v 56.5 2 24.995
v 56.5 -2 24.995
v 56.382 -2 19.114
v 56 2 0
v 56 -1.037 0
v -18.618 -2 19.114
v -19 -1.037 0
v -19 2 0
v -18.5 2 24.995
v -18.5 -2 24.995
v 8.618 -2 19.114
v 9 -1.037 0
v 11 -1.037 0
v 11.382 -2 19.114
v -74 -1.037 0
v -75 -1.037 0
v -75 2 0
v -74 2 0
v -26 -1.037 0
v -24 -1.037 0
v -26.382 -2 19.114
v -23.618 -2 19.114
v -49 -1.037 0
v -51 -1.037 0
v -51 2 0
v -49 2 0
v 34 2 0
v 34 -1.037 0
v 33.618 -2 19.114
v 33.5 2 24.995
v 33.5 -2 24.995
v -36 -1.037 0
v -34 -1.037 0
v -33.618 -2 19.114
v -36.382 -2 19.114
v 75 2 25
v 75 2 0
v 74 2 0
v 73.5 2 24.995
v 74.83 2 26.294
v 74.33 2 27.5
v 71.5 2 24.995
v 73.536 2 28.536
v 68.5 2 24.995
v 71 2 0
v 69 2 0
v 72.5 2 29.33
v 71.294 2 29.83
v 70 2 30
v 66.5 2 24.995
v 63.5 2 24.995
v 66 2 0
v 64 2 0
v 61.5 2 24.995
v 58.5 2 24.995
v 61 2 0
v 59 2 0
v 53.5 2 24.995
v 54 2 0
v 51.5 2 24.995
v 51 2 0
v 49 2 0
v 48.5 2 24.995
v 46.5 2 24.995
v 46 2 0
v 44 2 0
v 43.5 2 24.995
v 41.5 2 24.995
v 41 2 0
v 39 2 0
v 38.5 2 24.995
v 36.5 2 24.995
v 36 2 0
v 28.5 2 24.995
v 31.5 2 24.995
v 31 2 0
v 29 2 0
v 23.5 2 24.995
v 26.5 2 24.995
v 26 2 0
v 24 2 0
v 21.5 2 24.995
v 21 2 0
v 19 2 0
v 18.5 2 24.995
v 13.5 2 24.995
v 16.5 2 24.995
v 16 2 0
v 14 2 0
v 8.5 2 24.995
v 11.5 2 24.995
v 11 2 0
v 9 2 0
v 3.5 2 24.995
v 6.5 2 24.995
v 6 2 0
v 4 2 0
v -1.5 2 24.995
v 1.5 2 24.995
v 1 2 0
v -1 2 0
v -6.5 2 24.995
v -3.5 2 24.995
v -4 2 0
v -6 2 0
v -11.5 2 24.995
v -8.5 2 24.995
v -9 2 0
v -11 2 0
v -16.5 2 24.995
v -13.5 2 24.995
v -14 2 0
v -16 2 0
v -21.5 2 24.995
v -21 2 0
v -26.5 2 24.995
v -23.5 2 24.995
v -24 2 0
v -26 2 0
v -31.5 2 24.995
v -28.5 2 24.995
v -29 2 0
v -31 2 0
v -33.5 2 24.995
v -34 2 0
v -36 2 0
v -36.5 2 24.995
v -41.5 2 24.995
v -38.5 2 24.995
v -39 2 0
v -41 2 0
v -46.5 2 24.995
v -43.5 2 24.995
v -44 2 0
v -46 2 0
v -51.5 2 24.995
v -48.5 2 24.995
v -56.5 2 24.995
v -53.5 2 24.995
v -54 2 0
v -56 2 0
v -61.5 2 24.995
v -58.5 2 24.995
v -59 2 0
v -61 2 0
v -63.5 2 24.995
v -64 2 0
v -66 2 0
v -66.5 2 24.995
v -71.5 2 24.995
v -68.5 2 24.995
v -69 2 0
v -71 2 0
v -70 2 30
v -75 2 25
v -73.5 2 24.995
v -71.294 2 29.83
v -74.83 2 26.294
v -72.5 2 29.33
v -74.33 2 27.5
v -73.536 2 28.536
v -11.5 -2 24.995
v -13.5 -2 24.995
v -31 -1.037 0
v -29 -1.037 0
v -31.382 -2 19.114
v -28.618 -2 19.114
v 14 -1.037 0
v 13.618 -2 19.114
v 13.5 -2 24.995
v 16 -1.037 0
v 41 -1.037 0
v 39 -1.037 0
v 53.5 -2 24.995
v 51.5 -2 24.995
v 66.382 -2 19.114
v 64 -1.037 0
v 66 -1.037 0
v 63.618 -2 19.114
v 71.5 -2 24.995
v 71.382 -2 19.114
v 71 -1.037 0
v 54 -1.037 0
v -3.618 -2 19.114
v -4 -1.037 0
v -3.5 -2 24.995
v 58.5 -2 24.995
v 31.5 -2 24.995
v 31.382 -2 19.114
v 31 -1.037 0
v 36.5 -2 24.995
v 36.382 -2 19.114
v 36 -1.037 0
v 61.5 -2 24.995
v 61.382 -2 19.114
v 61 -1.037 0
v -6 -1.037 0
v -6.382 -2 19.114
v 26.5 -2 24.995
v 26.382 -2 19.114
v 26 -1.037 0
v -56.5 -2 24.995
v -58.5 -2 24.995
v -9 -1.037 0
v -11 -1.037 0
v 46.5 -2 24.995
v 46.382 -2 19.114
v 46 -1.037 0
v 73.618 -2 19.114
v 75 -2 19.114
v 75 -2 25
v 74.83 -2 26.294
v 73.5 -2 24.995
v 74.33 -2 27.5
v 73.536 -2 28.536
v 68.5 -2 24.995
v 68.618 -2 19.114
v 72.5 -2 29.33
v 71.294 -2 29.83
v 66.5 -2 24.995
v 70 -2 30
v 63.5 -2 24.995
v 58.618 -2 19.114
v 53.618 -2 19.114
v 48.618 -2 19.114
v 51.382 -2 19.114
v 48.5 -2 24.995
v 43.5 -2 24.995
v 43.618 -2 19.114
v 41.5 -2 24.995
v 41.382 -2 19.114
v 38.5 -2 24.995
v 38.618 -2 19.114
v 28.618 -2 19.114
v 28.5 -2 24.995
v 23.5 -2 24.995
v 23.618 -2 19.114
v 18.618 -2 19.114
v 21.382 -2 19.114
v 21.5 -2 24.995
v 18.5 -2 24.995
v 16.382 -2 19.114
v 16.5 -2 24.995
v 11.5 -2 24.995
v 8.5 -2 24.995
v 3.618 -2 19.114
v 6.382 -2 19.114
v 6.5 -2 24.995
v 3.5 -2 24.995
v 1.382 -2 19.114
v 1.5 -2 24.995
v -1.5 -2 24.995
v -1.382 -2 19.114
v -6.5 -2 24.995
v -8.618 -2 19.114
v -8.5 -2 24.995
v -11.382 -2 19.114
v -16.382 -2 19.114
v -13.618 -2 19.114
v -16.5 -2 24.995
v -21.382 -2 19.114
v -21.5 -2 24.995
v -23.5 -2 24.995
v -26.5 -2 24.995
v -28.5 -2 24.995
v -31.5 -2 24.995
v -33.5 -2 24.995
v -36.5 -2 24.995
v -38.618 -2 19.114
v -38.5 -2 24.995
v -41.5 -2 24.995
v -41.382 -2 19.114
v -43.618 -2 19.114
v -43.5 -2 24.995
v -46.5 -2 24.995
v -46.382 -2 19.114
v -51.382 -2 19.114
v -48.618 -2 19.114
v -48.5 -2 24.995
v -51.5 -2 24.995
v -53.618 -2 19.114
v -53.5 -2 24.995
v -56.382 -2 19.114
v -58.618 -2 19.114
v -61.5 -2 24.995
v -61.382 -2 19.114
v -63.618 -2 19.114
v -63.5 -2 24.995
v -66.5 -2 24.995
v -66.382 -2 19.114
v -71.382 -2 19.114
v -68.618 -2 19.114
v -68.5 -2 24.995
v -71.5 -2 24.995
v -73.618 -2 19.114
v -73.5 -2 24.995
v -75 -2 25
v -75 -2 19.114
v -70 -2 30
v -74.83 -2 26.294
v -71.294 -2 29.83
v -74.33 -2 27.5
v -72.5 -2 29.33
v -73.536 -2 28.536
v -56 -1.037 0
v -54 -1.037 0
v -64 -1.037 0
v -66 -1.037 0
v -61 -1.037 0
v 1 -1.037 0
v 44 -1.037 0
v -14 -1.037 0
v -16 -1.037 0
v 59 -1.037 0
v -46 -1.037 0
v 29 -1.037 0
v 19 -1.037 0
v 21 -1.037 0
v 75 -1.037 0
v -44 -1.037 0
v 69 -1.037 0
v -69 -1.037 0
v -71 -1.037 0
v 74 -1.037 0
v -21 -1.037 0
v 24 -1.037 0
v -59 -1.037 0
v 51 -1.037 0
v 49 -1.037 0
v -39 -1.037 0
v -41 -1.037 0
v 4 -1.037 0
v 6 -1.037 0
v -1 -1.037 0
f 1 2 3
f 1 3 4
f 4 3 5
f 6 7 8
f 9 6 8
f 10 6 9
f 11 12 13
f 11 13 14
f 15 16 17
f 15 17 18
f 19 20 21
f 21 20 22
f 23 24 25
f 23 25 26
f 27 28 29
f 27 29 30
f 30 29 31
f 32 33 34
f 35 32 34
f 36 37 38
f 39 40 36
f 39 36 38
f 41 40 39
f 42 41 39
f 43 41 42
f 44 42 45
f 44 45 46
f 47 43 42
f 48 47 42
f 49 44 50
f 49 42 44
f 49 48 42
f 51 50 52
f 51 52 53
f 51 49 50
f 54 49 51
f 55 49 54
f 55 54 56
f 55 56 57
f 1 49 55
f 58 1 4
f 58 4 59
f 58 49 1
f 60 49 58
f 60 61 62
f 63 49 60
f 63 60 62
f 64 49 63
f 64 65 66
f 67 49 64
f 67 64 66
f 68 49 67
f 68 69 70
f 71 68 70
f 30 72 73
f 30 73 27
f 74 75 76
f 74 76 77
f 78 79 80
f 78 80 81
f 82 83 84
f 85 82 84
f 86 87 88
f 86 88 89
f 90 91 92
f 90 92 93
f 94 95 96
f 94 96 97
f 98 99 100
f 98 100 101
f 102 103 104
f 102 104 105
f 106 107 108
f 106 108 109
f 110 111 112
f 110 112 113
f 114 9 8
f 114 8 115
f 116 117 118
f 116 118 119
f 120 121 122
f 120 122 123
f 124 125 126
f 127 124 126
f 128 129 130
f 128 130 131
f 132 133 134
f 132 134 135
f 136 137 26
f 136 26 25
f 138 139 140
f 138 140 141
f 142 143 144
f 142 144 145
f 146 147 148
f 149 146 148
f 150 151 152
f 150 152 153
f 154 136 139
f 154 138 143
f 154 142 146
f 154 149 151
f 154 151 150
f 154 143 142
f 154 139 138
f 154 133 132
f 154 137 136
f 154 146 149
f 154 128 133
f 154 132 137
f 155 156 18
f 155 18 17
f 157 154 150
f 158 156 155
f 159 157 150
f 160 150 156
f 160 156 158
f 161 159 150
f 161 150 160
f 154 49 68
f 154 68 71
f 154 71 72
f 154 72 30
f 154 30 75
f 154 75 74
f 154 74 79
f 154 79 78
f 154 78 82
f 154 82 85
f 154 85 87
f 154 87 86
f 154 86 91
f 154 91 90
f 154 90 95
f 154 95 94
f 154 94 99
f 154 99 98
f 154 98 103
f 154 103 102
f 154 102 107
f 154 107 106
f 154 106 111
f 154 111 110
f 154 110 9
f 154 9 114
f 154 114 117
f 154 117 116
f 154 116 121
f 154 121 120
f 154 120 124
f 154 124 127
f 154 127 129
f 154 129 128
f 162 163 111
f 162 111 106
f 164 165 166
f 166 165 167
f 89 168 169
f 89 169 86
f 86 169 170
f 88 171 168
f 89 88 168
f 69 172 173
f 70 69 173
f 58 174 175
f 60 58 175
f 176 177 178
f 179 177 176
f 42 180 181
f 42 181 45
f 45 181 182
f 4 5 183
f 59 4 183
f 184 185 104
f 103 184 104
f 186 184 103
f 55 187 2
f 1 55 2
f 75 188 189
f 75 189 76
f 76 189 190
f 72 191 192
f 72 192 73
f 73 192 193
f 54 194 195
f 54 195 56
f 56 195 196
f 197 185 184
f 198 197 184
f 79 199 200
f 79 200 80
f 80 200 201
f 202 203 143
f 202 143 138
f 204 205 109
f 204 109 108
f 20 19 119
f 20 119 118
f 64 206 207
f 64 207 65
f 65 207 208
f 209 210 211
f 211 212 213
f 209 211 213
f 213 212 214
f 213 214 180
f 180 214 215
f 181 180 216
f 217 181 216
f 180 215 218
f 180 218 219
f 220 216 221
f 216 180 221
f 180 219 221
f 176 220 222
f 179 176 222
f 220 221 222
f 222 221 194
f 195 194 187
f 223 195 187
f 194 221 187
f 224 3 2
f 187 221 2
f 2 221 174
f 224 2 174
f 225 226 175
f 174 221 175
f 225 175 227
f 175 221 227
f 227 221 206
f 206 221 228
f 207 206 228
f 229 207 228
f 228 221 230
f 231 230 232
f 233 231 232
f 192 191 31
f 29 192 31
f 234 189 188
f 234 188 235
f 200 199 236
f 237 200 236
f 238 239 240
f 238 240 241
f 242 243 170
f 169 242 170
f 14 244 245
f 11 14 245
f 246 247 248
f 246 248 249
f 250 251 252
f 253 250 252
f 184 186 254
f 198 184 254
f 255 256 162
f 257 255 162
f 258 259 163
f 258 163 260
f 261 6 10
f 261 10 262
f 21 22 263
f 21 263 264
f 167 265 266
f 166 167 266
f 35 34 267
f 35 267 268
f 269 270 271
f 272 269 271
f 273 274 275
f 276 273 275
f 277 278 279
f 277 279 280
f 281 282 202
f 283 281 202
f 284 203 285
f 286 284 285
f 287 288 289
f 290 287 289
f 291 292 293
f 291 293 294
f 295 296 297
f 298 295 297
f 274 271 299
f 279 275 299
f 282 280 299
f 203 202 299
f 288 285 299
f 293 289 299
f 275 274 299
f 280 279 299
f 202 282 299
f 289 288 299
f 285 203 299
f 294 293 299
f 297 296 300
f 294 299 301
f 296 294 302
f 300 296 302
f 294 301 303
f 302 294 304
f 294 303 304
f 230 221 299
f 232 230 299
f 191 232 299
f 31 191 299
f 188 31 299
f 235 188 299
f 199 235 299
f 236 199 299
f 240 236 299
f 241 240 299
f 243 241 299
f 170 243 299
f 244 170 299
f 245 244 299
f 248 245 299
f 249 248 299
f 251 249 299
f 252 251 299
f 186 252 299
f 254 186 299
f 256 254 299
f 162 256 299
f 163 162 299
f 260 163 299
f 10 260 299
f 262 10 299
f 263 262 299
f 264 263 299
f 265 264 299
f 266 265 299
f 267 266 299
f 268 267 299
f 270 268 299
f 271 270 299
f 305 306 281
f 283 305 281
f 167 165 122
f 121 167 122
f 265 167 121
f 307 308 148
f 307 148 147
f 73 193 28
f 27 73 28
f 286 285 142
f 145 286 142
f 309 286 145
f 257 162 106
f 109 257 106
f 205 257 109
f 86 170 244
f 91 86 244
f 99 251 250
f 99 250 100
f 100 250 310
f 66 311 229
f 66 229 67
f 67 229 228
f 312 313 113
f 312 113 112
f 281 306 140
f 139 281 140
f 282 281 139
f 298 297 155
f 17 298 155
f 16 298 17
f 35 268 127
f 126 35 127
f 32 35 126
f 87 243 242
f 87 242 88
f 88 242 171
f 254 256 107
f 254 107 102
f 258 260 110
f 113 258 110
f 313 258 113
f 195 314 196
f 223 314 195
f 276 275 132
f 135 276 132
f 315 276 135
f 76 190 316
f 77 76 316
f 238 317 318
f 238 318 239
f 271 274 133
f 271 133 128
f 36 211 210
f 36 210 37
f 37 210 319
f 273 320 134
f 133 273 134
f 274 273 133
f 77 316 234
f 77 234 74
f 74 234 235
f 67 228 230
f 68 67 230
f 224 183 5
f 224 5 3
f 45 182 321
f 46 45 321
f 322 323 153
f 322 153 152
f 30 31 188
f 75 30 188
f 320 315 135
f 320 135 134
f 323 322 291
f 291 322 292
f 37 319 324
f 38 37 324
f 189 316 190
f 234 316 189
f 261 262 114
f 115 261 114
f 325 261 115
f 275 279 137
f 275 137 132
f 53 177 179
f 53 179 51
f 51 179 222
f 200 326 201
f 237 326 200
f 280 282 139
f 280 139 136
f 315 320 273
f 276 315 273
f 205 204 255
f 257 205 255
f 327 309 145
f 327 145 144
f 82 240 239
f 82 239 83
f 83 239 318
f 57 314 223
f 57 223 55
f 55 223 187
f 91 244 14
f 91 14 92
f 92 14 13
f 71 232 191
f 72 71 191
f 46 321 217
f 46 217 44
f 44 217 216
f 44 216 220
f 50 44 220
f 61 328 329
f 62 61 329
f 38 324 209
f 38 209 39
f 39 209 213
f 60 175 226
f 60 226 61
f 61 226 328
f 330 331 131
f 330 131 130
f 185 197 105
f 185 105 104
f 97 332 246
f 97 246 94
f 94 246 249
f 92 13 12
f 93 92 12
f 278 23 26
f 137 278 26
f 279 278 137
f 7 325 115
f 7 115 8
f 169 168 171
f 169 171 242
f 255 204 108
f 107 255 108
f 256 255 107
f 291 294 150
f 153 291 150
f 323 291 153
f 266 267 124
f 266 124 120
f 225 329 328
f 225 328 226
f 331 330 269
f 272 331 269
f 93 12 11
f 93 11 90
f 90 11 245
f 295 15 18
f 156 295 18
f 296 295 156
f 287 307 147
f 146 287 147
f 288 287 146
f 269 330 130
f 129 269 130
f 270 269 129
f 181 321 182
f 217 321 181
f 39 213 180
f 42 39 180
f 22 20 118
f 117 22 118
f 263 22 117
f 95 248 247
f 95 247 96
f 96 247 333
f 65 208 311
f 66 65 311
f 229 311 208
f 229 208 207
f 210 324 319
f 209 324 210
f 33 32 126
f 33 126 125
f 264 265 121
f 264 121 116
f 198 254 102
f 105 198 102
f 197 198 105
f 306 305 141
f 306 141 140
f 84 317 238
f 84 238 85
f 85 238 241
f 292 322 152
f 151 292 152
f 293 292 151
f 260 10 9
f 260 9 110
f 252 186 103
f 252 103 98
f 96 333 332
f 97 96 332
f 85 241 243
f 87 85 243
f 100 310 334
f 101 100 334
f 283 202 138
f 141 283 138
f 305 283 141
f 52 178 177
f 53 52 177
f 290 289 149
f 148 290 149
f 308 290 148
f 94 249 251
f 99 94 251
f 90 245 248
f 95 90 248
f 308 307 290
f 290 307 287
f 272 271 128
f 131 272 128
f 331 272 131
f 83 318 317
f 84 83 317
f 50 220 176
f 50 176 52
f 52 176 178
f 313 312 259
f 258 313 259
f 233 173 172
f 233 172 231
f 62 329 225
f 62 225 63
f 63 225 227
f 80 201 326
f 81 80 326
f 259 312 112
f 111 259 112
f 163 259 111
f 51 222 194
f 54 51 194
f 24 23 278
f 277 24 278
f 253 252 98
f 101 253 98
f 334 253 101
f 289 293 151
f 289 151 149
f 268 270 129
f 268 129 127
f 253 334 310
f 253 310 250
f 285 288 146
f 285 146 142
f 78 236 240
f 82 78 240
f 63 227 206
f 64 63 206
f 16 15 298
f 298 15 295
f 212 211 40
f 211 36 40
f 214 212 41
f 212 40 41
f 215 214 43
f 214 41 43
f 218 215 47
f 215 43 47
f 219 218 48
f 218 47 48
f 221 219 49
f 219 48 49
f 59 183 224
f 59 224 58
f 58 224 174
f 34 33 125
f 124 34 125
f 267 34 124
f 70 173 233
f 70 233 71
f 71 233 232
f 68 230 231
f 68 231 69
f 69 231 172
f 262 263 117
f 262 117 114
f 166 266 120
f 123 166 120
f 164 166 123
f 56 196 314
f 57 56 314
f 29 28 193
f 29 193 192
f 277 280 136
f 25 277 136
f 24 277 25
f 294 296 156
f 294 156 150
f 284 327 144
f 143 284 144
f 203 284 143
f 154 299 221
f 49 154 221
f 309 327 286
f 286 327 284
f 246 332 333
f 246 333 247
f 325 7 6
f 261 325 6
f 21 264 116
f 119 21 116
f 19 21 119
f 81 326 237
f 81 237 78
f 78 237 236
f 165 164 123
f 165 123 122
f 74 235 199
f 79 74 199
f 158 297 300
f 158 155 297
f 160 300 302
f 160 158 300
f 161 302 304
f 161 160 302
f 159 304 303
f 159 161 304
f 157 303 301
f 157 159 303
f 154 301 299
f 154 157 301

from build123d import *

# Parameters (mm, degrees)
F1_DEPTH = 2
F2_R     = 5
F4_DEPTH = 208


with BuildPart() as f1:
    # F0 (on Front) → F1 (new body, symmetric)
    with BuildSketch(Plane.XZ):
        Polygon((-75, 30), (-75, 0), (-74, 0), (-73.5, 24.994999), (-71.5, 24.994999), (-71, 0), (-69, 0), (-68.5, 24.994999), (-66.5, 24.994999), (-66, 0), (-64, 0), (-63.5, 24.994999), (-61.5, 24.994999), (-61, 0), (-59, 0), (-58.5, 24.994999), (-56.5, 24.994999), (-56, 0), (-54, 0), (-53.5, 24.994999), (-51.5, 24.994999), (-51, 0), (-49, 0), (-48.5, 24.994999), (-46.5, 24.994999), (-46, 0), (-44, 0), (-43.5, 24.994999), (-41.5, 24.994999), (-41, 0), (-39, 0), (-38.5, 24.994999), (-36.5, 24.994999), (-36, 0), (-34, 0), (-33.5, 24.994999), (-31.5, 24.994999), (-31, 0), (-29, 0), (-28.5, 24.994999), (-26.5, 24.994999), (-26, 0), (-24, 0), (-23.5, 24.994999), (-21.5, 24.994999), (-21, 0), (-19, 0), (-18.5, 24.994999), (-16.5, 24.994999), (-16, 0), (-14, 0), (-13.5, 24.994999), (-11.5, 24.994999), (-11, 0), (-9, 0), (-8.5, 24.994999), (-6.5, 24.994999), (-6, 0), (-4, 0), (-3.5, 24.994999), (-1.5, 24.994999), (-1, 0), (0, 0), (0, 30), align=None)
    extrude(amount=F1_DEPTH, both=True)

    # F2
    f2_edges = [f1.edges().sort_by_distance(p)[0] for p in [
        (-75, 0, 30),
    ]]
    fillet(f2_edges, radius=F2_R)

    # F3 (on Right) → F4 (cut)
    with BuildSketch(Plane.YZ):
        Polygon((-1.037374, 0), (-2, 19.114297), (-2, 0), align=None)
    extrude(amount=-F4_DEPTH, mode=Mode.SUBTRACT)

    # F5: F1 across face


with BuildPart() as f1_1:
    add(f1.part)
    add(f1.part.mirror(Plane(origin=(0, 0.139421, 15.716448), x_dir=(0, 1, 0), z_dir=(1, 0, 0))))


solid = f1_1.part
